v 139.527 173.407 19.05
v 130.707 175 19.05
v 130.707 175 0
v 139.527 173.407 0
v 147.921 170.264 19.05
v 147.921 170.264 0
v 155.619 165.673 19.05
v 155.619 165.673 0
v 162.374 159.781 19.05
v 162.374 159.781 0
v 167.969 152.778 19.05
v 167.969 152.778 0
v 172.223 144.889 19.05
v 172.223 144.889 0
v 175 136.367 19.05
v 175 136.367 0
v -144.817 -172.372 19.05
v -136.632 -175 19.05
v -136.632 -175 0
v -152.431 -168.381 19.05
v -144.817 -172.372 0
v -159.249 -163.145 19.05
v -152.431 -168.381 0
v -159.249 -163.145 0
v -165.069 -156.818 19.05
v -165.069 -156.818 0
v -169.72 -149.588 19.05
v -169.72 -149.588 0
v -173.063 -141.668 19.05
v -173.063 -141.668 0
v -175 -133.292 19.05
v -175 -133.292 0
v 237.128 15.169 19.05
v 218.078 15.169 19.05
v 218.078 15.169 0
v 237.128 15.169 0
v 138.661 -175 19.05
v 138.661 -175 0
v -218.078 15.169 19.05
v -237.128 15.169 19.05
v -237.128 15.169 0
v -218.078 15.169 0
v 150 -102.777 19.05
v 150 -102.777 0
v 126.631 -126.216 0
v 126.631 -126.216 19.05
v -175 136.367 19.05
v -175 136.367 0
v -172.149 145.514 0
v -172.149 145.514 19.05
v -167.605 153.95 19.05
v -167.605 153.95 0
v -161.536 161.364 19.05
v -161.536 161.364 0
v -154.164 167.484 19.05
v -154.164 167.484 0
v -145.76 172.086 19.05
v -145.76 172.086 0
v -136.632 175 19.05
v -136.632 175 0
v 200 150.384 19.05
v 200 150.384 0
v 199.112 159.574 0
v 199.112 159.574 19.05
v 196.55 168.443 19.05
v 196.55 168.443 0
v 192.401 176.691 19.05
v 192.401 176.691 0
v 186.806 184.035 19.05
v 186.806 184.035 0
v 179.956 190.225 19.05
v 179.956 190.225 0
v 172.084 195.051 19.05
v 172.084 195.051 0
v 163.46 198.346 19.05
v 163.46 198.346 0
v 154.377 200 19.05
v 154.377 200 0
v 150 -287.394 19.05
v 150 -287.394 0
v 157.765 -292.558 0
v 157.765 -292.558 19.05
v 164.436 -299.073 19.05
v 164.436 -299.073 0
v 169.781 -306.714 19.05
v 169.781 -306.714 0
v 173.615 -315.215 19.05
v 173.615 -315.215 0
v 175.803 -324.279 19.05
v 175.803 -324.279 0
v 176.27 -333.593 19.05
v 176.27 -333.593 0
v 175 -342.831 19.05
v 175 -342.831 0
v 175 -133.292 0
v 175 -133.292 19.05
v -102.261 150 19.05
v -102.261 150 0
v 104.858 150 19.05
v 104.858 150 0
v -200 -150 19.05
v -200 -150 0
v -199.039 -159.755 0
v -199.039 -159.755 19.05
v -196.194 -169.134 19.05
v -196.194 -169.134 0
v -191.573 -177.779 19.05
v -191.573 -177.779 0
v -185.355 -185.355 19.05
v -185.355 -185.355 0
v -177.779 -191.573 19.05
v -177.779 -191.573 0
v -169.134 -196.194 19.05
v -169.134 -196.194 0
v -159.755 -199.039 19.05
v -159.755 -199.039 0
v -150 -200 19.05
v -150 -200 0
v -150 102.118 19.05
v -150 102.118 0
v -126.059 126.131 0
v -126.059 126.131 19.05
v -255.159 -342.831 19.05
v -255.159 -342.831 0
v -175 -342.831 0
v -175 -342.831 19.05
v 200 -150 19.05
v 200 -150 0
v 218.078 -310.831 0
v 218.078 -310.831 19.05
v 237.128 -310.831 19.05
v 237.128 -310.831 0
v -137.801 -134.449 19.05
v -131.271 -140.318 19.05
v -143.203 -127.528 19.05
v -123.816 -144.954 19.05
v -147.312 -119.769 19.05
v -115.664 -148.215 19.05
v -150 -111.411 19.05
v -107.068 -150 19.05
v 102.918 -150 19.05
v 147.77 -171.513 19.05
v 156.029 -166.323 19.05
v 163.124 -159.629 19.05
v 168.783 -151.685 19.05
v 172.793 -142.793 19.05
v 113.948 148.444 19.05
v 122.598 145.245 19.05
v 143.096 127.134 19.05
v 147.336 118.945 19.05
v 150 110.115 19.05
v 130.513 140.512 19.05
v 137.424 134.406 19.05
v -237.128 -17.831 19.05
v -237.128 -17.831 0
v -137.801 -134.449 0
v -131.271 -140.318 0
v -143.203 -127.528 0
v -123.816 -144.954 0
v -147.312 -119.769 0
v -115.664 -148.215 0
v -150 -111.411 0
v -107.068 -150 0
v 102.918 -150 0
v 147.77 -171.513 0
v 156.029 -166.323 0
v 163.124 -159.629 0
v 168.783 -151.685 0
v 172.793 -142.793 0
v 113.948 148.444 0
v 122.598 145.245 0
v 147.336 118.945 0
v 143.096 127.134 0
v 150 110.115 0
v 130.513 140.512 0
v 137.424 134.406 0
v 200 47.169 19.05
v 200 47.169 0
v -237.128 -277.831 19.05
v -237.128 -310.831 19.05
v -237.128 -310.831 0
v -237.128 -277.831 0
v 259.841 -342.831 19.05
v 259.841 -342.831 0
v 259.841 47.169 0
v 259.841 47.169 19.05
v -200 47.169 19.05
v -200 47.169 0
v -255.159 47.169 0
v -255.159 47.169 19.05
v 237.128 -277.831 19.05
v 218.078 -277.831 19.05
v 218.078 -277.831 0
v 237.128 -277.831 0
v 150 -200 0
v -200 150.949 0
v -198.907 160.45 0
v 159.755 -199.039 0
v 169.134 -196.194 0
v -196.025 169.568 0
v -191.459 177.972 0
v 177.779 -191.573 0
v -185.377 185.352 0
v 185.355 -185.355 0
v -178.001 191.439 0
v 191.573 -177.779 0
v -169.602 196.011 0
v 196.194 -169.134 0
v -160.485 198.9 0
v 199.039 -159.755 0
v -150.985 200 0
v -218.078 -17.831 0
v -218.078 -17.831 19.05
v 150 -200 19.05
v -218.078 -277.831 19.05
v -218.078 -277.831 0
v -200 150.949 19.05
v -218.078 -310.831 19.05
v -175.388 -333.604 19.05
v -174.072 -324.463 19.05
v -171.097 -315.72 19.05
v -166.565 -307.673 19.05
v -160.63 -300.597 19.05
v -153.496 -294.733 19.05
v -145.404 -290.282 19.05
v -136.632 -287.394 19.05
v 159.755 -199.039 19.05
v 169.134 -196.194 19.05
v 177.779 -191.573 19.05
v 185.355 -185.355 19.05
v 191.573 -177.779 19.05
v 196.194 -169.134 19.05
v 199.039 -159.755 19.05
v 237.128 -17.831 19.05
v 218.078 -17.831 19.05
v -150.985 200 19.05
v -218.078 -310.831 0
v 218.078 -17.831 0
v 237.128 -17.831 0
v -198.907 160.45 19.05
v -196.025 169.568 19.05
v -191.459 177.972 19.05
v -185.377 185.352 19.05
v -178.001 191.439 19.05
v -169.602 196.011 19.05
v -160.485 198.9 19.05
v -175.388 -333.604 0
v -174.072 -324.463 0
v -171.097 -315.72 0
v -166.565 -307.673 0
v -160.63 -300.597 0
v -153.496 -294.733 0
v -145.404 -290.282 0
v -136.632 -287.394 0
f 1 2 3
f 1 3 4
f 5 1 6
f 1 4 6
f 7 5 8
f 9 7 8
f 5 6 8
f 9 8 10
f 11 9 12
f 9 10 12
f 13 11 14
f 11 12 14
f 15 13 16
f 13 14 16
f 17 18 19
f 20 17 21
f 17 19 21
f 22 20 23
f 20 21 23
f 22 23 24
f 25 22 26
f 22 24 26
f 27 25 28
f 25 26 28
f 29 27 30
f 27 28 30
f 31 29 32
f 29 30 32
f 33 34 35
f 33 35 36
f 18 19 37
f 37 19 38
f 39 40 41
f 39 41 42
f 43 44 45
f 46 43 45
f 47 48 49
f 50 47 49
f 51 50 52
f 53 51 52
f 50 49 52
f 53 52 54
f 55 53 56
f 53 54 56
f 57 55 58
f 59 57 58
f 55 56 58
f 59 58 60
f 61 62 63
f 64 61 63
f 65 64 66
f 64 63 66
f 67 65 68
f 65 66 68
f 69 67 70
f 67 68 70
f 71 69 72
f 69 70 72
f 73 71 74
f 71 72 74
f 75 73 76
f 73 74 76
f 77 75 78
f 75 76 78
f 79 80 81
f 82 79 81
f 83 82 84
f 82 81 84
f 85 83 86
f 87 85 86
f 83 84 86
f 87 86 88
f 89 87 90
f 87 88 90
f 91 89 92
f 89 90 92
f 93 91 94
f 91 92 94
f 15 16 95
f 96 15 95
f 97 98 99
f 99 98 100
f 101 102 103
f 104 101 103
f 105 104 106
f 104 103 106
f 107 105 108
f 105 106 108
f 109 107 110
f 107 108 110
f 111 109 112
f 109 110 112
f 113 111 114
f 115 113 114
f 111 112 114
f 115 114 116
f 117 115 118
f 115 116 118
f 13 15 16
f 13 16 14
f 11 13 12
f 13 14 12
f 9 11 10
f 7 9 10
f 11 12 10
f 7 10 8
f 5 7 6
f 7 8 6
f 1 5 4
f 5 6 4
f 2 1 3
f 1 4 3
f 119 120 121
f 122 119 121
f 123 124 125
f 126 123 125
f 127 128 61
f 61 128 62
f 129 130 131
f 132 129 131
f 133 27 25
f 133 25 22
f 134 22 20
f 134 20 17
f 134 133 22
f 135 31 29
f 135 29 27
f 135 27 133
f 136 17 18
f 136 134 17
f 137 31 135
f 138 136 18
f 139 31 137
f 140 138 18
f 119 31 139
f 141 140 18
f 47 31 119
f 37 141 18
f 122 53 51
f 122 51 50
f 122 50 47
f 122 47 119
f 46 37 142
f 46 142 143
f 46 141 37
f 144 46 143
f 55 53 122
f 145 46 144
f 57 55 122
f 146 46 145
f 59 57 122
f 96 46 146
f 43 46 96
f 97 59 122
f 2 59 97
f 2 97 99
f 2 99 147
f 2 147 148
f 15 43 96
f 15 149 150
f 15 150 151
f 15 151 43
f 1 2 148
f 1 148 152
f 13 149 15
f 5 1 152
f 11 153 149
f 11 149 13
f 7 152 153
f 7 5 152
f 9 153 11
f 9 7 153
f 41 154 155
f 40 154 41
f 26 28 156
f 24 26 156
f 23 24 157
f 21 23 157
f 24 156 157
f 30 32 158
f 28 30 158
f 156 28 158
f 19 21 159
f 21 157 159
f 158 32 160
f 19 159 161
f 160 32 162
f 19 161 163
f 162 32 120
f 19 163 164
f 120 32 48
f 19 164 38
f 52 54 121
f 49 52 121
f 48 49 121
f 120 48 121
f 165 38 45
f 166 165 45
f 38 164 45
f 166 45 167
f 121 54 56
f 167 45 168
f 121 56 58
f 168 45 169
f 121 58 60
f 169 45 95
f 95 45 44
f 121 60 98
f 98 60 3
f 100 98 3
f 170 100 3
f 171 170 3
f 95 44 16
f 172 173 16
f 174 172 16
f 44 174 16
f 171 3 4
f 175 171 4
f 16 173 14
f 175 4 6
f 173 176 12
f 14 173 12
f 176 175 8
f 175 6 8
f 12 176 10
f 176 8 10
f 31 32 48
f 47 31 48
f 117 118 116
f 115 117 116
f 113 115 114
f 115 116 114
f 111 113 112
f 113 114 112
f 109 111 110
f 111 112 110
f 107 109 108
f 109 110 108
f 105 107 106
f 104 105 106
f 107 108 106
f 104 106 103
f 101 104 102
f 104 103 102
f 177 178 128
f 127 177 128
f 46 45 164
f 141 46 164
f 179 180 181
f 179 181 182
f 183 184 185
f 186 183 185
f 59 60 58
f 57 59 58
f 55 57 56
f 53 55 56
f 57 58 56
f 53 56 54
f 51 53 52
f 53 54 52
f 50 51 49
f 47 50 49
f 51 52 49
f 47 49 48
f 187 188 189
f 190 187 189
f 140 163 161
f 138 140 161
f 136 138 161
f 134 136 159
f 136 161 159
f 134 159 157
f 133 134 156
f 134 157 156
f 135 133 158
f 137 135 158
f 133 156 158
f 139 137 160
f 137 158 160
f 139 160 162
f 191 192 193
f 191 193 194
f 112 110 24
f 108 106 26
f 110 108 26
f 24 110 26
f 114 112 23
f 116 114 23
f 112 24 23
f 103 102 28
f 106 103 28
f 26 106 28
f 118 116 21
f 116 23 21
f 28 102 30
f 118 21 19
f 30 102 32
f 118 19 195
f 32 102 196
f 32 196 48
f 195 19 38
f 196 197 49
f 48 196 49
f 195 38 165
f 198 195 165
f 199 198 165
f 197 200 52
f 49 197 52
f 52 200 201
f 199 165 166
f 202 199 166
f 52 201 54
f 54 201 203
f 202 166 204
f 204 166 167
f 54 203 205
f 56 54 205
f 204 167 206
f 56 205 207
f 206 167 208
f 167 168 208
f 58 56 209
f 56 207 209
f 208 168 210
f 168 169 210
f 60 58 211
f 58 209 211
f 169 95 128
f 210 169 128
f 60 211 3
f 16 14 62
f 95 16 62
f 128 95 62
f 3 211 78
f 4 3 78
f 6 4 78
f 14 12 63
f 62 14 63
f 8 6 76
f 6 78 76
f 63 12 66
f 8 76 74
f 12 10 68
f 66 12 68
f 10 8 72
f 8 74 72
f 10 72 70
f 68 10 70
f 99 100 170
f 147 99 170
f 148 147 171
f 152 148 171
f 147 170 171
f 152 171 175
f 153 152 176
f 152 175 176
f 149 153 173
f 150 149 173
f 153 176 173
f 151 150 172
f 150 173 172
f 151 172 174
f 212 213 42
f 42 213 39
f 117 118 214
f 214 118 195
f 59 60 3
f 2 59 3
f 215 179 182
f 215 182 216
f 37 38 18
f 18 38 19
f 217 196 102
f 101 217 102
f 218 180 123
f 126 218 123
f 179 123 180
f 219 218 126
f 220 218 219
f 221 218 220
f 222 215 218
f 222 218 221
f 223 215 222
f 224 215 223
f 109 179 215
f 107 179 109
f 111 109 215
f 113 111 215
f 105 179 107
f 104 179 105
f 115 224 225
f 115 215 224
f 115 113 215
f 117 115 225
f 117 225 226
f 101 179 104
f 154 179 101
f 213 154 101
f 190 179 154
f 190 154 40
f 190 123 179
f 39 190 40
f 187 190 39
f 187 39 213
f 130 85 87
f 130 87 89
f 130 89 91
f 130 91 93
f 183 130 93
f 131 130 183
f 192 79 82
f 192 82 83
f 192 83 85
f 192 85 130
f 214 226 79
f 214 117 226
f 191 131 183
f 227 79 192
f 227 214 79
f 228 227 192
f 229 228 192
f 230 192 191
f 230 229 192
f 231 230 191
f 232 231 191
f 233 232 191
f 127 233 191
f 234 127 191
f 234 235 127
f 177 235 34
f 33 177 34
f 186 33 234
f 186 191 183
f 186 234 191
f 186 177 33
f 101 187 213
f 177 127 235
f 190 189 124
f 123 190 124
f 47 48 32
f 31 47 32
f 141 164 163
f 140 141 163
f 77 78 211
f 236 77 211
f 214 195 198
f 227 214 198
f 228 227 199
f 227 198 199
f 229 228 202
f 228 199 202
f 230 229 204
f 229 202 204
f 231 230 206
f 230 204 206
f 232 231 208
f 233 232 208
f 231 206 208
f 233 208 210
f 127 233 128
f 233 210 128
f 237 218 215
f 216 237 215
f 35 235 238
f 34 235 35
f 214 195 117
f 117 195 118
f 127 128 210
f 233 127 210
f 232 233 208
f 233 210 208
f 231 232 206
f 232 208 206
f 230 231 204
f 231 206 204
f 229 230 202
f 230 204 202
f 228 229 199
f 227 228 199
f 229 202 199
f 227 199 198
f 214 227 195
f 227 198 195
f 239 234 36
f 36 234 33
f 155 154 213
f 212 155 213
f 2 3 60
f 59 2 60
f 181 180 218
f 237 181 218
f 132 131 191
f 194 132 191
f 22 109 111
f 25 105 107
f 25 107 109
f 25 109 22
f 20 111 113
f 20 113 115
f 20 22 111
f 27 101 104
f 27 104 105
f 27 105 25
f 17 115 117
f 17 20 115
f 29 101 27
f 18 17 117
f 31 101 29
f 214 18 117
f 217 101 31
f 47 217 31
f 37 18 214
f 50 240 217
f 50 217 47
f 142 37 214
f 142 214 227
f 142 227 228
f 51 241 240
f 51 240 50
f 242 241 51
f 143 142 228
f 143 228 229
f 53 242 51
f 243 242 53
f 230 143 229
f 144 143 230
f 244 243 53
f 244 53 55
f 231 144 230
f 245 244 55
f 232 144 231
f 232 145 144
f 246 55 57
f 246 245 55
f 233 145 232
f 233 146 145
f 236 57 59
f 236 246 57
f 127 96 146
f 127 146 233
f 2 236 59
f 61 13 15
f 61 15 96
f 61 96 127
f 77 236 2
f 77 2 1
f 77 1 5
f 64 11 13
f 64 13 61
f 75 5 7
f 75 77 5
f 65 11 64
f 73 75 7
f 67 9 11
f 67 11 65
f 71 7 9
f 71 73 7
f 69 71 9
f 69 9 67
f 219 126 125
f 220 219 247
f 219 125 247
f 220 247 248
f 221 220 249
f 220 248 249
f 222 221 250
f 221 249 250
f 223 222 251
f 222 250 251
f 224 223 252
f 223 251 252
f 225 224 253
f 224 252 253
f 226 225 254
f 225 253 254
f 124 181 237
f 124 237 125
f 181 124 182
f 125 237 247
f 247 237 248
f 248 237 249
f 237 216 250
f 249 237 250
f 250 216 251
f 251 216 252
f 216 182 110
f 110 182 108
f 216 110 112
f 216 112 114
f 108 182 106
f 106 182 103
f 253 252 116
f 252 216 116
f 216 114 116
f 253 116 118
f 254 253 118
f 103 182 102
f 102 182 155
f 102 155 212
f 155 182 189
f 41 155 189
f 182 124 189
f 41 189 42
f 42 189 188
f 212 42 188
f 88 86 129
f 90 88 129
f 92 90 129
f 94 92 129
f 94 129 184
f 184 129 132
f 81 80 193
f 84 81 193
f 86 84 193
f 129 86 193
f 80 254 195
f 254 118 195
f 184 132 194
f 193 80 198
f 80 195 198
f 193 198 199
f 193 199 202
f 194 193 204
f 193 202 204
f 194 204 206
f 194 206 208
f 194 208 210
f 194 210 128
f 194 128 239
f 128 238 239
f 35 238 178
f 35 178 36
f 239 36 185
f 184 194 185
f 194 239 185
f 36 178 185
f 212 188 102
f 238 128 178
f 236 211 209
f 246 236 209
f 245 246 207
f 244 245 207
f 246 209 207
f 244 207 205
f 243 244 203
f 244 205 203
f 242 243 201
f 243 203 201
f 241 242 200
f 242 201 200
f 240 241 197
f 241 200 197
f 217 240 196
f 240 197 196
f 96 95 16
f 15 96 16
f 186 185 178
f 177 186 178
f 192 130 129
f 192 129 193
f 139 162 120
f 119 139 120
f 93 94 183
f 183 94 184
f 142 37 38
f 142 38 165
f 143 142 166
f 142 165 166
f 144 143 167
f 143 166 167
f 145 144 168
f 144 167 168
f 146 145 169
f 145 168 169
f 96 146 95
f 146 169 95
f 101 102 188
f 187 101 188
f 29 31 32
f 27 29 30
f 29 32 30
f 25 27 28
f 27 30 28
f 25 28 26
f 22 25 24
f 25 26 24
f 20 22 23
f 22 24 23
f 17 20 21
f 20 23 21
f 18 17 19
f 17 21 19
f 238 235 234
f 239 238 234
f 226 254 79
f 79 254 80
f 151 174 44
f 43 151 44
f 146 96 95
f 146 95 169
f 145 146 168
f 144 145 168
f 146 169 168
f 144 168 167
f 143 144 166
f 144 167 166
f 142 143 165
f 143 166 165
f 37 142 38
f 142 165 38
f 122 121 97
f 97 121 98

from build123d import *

# Parameters (mm, degrees)
F1_DEPTH = 19.05
F2_DEPTH = 19.05
F3_DEPTH = 19.05
F4_W     = 19.05
F4_H     = 33
F5_DEPTH = 19.051


with BuildPart() as f1:
    # F0 (on Top) → F1 (new body)
    with BuildSketch(Plane.XY):
        with BuildLine():
            Line((-200, -150), (-200, 47.169192))
            Line((-200, 47.169192), (-255.159124, 47.169192))
            Line((-255.159124, 47.169192), (-255.159124, -342.830808))
            Line((-255.159124, -342.830808), (-175, -342.830808))
            ThreePointArc((-175, -342.830808), (-166.564923, -307.673176), (-136.632211, -287.394066))
            Line((-136.632211, -287.394066), (150, -287.394066))
            ThreePointArc((150, -287.394066), (171.896841, -310.874796), (175, -342.830808))
            Line((175, -342.830808), (259.840876, -342.830808))
            Line((259.840876, -342.830808), (259.840876, 47.169192))
            Line((259.840876, 47.169192), (200, 47.169192))
            Line((200, 47.169192), (200, -150))
            ThreePointArc((200, -150), (185.355339, -185.355339), (150, -200))
            Line((150, -200), (-150, -200))
            ThreePointArc((-150, -200), (-185.355339, -185.355339), (-200, -150))
        make_face()
    extrude(amount=F1_DEPTH)

    # F4 (on face) → F5 (cut, through all)
    with BuildSketch(Plane.XY.offset(19.05)):
        with Locations((-227.603092, -1.330808)):
            Rectangle(F4_W, F4_H)
        with Locations((-227.603092, -294.330808)):
            Rectangle(F4_W, F4_H)
        with Locations((227.603092, -1.330808)):
            Rectangle(F4_W, F4_H)
        with Locations((227.603092, -294.330808)):
            Rectangle(F4_W, F4_H)
    extrude(amount=-F5_DEPTH, mode=Mode.SUBTRACT)


with BuildPart() as f2:
    # F0 (on Top) → F2 (new body)
    with BuildSketch(Plane.XY):
        with BuildLine():
            Line((-149.032295, 200), (-150.985367, 200))
            ThreePointArc((-150.985367, 200), (-185.377198, 185.351844), (-200, 150.949225))
            Line((-200, 150.949225), (-200, 47.169192))
            Line((-200, 47.169192), (-200, -150))
            ThreePointArc((-200, -150), (-185.355339, -185.355339), (-150, -200))
            Line((-150, -200), (150, -200))
            ThreePointArc((150, -200), (185.355339, -185.355339), (200, -150))
            Line((200, -150), (200, 47.169192))
            Line((200, 47.169192), (200, 150))
            Line((200, 150), (200, 150.38382))
            ThreePointArc((200, 150.38382), (186.805716, 184.035172), (154.376919, 200))
            Line((154.376919, 200), (145.623818, 200))
            Line((145.623818, 200), (-149.032295, 200))
        make_face()
        with BuildLine():
            ThreePointArc((-175, 136.366984), (-161.535938, 161.364057), (-136.632211, 175))
            Line((-136.632211, 175), (130.706638, 175))
            ThreePointArc((130.706638, 175), (159.129068, 162.878737), (175, 136.366984))
            Line((175, 136.366984), (175, -133.292252))
            ThreePointArc((175, -133.292252), (163.123617, -159.629349), (138.660701, -175))
            Line((138.660701, -175), (-136.632211, -175))
            ThreePointArc((-136.632211, -175), (-162.295646, -160.106785), (-175, -133.292252))
            Line((-175, -133.292252), (-175, 136.366984))
        make_face(mode=Mode.SUBTRACT)
    extrude(amount=F2_DEPTH)


with BuildPart() as f3:
    # F0 (on Top) → F3 (new body)
    with BuildSketch(Plane.XY):
        with BuildLine():
            Line((130.706638, 175), (-136.632211, 175))
            ThreePointArc((-136.632211, 175), (-161.535938, 161.364057), (-175, 136.366984))
            Line((-175, 136.366984), (-175, -133.292252))
            ThreePointArc((-175, -133.292252), (-162.295646, -160.106785), (-136.632211, -175))
            Line((-136.632211, -175), (138.660701, -175))
            ThreePointArc((138.660701, -175), (163.123617, -159.629349), (175, -133.292252))
            Line((175, -133.292252), (175, 136.366984))
            ThreePointArc((175, 136.366984), (159.129068, 162.878737), (130.706638, 175))
        make_face()
        with BuildLine():
            Line((-126.059029, 126.130707), (-102.261199, 150))
            Line((-102.261199, 150), (104.858465, 150))
            ThreePointArc((104.858465, 150), (134.109571, 137.618583), (150, 110.115476))
            Line((150, 110.115476), (150, -102.776636))
            Line((150, -102.776636), (126.630977, -126.215835))
            Line((126.630977, -126.215835), (102.918019, -150))
            Line((102.918019, -150), (-107.067909, -150))
            ThreePointArc((-107.067909, -150), (-134.66533, -137.526789), (-150, -111.410768))
            Line((-150, -111.410768), (-150, 102.117843))
            Line((-150, 102.117843), (-126.059029, 126.130707))
        make_face(mode=Mode.SUBTRACT)
    extrude(amount=F3_DEPTH)


solid = Compound([f1.part, f2.part, f3.part])
